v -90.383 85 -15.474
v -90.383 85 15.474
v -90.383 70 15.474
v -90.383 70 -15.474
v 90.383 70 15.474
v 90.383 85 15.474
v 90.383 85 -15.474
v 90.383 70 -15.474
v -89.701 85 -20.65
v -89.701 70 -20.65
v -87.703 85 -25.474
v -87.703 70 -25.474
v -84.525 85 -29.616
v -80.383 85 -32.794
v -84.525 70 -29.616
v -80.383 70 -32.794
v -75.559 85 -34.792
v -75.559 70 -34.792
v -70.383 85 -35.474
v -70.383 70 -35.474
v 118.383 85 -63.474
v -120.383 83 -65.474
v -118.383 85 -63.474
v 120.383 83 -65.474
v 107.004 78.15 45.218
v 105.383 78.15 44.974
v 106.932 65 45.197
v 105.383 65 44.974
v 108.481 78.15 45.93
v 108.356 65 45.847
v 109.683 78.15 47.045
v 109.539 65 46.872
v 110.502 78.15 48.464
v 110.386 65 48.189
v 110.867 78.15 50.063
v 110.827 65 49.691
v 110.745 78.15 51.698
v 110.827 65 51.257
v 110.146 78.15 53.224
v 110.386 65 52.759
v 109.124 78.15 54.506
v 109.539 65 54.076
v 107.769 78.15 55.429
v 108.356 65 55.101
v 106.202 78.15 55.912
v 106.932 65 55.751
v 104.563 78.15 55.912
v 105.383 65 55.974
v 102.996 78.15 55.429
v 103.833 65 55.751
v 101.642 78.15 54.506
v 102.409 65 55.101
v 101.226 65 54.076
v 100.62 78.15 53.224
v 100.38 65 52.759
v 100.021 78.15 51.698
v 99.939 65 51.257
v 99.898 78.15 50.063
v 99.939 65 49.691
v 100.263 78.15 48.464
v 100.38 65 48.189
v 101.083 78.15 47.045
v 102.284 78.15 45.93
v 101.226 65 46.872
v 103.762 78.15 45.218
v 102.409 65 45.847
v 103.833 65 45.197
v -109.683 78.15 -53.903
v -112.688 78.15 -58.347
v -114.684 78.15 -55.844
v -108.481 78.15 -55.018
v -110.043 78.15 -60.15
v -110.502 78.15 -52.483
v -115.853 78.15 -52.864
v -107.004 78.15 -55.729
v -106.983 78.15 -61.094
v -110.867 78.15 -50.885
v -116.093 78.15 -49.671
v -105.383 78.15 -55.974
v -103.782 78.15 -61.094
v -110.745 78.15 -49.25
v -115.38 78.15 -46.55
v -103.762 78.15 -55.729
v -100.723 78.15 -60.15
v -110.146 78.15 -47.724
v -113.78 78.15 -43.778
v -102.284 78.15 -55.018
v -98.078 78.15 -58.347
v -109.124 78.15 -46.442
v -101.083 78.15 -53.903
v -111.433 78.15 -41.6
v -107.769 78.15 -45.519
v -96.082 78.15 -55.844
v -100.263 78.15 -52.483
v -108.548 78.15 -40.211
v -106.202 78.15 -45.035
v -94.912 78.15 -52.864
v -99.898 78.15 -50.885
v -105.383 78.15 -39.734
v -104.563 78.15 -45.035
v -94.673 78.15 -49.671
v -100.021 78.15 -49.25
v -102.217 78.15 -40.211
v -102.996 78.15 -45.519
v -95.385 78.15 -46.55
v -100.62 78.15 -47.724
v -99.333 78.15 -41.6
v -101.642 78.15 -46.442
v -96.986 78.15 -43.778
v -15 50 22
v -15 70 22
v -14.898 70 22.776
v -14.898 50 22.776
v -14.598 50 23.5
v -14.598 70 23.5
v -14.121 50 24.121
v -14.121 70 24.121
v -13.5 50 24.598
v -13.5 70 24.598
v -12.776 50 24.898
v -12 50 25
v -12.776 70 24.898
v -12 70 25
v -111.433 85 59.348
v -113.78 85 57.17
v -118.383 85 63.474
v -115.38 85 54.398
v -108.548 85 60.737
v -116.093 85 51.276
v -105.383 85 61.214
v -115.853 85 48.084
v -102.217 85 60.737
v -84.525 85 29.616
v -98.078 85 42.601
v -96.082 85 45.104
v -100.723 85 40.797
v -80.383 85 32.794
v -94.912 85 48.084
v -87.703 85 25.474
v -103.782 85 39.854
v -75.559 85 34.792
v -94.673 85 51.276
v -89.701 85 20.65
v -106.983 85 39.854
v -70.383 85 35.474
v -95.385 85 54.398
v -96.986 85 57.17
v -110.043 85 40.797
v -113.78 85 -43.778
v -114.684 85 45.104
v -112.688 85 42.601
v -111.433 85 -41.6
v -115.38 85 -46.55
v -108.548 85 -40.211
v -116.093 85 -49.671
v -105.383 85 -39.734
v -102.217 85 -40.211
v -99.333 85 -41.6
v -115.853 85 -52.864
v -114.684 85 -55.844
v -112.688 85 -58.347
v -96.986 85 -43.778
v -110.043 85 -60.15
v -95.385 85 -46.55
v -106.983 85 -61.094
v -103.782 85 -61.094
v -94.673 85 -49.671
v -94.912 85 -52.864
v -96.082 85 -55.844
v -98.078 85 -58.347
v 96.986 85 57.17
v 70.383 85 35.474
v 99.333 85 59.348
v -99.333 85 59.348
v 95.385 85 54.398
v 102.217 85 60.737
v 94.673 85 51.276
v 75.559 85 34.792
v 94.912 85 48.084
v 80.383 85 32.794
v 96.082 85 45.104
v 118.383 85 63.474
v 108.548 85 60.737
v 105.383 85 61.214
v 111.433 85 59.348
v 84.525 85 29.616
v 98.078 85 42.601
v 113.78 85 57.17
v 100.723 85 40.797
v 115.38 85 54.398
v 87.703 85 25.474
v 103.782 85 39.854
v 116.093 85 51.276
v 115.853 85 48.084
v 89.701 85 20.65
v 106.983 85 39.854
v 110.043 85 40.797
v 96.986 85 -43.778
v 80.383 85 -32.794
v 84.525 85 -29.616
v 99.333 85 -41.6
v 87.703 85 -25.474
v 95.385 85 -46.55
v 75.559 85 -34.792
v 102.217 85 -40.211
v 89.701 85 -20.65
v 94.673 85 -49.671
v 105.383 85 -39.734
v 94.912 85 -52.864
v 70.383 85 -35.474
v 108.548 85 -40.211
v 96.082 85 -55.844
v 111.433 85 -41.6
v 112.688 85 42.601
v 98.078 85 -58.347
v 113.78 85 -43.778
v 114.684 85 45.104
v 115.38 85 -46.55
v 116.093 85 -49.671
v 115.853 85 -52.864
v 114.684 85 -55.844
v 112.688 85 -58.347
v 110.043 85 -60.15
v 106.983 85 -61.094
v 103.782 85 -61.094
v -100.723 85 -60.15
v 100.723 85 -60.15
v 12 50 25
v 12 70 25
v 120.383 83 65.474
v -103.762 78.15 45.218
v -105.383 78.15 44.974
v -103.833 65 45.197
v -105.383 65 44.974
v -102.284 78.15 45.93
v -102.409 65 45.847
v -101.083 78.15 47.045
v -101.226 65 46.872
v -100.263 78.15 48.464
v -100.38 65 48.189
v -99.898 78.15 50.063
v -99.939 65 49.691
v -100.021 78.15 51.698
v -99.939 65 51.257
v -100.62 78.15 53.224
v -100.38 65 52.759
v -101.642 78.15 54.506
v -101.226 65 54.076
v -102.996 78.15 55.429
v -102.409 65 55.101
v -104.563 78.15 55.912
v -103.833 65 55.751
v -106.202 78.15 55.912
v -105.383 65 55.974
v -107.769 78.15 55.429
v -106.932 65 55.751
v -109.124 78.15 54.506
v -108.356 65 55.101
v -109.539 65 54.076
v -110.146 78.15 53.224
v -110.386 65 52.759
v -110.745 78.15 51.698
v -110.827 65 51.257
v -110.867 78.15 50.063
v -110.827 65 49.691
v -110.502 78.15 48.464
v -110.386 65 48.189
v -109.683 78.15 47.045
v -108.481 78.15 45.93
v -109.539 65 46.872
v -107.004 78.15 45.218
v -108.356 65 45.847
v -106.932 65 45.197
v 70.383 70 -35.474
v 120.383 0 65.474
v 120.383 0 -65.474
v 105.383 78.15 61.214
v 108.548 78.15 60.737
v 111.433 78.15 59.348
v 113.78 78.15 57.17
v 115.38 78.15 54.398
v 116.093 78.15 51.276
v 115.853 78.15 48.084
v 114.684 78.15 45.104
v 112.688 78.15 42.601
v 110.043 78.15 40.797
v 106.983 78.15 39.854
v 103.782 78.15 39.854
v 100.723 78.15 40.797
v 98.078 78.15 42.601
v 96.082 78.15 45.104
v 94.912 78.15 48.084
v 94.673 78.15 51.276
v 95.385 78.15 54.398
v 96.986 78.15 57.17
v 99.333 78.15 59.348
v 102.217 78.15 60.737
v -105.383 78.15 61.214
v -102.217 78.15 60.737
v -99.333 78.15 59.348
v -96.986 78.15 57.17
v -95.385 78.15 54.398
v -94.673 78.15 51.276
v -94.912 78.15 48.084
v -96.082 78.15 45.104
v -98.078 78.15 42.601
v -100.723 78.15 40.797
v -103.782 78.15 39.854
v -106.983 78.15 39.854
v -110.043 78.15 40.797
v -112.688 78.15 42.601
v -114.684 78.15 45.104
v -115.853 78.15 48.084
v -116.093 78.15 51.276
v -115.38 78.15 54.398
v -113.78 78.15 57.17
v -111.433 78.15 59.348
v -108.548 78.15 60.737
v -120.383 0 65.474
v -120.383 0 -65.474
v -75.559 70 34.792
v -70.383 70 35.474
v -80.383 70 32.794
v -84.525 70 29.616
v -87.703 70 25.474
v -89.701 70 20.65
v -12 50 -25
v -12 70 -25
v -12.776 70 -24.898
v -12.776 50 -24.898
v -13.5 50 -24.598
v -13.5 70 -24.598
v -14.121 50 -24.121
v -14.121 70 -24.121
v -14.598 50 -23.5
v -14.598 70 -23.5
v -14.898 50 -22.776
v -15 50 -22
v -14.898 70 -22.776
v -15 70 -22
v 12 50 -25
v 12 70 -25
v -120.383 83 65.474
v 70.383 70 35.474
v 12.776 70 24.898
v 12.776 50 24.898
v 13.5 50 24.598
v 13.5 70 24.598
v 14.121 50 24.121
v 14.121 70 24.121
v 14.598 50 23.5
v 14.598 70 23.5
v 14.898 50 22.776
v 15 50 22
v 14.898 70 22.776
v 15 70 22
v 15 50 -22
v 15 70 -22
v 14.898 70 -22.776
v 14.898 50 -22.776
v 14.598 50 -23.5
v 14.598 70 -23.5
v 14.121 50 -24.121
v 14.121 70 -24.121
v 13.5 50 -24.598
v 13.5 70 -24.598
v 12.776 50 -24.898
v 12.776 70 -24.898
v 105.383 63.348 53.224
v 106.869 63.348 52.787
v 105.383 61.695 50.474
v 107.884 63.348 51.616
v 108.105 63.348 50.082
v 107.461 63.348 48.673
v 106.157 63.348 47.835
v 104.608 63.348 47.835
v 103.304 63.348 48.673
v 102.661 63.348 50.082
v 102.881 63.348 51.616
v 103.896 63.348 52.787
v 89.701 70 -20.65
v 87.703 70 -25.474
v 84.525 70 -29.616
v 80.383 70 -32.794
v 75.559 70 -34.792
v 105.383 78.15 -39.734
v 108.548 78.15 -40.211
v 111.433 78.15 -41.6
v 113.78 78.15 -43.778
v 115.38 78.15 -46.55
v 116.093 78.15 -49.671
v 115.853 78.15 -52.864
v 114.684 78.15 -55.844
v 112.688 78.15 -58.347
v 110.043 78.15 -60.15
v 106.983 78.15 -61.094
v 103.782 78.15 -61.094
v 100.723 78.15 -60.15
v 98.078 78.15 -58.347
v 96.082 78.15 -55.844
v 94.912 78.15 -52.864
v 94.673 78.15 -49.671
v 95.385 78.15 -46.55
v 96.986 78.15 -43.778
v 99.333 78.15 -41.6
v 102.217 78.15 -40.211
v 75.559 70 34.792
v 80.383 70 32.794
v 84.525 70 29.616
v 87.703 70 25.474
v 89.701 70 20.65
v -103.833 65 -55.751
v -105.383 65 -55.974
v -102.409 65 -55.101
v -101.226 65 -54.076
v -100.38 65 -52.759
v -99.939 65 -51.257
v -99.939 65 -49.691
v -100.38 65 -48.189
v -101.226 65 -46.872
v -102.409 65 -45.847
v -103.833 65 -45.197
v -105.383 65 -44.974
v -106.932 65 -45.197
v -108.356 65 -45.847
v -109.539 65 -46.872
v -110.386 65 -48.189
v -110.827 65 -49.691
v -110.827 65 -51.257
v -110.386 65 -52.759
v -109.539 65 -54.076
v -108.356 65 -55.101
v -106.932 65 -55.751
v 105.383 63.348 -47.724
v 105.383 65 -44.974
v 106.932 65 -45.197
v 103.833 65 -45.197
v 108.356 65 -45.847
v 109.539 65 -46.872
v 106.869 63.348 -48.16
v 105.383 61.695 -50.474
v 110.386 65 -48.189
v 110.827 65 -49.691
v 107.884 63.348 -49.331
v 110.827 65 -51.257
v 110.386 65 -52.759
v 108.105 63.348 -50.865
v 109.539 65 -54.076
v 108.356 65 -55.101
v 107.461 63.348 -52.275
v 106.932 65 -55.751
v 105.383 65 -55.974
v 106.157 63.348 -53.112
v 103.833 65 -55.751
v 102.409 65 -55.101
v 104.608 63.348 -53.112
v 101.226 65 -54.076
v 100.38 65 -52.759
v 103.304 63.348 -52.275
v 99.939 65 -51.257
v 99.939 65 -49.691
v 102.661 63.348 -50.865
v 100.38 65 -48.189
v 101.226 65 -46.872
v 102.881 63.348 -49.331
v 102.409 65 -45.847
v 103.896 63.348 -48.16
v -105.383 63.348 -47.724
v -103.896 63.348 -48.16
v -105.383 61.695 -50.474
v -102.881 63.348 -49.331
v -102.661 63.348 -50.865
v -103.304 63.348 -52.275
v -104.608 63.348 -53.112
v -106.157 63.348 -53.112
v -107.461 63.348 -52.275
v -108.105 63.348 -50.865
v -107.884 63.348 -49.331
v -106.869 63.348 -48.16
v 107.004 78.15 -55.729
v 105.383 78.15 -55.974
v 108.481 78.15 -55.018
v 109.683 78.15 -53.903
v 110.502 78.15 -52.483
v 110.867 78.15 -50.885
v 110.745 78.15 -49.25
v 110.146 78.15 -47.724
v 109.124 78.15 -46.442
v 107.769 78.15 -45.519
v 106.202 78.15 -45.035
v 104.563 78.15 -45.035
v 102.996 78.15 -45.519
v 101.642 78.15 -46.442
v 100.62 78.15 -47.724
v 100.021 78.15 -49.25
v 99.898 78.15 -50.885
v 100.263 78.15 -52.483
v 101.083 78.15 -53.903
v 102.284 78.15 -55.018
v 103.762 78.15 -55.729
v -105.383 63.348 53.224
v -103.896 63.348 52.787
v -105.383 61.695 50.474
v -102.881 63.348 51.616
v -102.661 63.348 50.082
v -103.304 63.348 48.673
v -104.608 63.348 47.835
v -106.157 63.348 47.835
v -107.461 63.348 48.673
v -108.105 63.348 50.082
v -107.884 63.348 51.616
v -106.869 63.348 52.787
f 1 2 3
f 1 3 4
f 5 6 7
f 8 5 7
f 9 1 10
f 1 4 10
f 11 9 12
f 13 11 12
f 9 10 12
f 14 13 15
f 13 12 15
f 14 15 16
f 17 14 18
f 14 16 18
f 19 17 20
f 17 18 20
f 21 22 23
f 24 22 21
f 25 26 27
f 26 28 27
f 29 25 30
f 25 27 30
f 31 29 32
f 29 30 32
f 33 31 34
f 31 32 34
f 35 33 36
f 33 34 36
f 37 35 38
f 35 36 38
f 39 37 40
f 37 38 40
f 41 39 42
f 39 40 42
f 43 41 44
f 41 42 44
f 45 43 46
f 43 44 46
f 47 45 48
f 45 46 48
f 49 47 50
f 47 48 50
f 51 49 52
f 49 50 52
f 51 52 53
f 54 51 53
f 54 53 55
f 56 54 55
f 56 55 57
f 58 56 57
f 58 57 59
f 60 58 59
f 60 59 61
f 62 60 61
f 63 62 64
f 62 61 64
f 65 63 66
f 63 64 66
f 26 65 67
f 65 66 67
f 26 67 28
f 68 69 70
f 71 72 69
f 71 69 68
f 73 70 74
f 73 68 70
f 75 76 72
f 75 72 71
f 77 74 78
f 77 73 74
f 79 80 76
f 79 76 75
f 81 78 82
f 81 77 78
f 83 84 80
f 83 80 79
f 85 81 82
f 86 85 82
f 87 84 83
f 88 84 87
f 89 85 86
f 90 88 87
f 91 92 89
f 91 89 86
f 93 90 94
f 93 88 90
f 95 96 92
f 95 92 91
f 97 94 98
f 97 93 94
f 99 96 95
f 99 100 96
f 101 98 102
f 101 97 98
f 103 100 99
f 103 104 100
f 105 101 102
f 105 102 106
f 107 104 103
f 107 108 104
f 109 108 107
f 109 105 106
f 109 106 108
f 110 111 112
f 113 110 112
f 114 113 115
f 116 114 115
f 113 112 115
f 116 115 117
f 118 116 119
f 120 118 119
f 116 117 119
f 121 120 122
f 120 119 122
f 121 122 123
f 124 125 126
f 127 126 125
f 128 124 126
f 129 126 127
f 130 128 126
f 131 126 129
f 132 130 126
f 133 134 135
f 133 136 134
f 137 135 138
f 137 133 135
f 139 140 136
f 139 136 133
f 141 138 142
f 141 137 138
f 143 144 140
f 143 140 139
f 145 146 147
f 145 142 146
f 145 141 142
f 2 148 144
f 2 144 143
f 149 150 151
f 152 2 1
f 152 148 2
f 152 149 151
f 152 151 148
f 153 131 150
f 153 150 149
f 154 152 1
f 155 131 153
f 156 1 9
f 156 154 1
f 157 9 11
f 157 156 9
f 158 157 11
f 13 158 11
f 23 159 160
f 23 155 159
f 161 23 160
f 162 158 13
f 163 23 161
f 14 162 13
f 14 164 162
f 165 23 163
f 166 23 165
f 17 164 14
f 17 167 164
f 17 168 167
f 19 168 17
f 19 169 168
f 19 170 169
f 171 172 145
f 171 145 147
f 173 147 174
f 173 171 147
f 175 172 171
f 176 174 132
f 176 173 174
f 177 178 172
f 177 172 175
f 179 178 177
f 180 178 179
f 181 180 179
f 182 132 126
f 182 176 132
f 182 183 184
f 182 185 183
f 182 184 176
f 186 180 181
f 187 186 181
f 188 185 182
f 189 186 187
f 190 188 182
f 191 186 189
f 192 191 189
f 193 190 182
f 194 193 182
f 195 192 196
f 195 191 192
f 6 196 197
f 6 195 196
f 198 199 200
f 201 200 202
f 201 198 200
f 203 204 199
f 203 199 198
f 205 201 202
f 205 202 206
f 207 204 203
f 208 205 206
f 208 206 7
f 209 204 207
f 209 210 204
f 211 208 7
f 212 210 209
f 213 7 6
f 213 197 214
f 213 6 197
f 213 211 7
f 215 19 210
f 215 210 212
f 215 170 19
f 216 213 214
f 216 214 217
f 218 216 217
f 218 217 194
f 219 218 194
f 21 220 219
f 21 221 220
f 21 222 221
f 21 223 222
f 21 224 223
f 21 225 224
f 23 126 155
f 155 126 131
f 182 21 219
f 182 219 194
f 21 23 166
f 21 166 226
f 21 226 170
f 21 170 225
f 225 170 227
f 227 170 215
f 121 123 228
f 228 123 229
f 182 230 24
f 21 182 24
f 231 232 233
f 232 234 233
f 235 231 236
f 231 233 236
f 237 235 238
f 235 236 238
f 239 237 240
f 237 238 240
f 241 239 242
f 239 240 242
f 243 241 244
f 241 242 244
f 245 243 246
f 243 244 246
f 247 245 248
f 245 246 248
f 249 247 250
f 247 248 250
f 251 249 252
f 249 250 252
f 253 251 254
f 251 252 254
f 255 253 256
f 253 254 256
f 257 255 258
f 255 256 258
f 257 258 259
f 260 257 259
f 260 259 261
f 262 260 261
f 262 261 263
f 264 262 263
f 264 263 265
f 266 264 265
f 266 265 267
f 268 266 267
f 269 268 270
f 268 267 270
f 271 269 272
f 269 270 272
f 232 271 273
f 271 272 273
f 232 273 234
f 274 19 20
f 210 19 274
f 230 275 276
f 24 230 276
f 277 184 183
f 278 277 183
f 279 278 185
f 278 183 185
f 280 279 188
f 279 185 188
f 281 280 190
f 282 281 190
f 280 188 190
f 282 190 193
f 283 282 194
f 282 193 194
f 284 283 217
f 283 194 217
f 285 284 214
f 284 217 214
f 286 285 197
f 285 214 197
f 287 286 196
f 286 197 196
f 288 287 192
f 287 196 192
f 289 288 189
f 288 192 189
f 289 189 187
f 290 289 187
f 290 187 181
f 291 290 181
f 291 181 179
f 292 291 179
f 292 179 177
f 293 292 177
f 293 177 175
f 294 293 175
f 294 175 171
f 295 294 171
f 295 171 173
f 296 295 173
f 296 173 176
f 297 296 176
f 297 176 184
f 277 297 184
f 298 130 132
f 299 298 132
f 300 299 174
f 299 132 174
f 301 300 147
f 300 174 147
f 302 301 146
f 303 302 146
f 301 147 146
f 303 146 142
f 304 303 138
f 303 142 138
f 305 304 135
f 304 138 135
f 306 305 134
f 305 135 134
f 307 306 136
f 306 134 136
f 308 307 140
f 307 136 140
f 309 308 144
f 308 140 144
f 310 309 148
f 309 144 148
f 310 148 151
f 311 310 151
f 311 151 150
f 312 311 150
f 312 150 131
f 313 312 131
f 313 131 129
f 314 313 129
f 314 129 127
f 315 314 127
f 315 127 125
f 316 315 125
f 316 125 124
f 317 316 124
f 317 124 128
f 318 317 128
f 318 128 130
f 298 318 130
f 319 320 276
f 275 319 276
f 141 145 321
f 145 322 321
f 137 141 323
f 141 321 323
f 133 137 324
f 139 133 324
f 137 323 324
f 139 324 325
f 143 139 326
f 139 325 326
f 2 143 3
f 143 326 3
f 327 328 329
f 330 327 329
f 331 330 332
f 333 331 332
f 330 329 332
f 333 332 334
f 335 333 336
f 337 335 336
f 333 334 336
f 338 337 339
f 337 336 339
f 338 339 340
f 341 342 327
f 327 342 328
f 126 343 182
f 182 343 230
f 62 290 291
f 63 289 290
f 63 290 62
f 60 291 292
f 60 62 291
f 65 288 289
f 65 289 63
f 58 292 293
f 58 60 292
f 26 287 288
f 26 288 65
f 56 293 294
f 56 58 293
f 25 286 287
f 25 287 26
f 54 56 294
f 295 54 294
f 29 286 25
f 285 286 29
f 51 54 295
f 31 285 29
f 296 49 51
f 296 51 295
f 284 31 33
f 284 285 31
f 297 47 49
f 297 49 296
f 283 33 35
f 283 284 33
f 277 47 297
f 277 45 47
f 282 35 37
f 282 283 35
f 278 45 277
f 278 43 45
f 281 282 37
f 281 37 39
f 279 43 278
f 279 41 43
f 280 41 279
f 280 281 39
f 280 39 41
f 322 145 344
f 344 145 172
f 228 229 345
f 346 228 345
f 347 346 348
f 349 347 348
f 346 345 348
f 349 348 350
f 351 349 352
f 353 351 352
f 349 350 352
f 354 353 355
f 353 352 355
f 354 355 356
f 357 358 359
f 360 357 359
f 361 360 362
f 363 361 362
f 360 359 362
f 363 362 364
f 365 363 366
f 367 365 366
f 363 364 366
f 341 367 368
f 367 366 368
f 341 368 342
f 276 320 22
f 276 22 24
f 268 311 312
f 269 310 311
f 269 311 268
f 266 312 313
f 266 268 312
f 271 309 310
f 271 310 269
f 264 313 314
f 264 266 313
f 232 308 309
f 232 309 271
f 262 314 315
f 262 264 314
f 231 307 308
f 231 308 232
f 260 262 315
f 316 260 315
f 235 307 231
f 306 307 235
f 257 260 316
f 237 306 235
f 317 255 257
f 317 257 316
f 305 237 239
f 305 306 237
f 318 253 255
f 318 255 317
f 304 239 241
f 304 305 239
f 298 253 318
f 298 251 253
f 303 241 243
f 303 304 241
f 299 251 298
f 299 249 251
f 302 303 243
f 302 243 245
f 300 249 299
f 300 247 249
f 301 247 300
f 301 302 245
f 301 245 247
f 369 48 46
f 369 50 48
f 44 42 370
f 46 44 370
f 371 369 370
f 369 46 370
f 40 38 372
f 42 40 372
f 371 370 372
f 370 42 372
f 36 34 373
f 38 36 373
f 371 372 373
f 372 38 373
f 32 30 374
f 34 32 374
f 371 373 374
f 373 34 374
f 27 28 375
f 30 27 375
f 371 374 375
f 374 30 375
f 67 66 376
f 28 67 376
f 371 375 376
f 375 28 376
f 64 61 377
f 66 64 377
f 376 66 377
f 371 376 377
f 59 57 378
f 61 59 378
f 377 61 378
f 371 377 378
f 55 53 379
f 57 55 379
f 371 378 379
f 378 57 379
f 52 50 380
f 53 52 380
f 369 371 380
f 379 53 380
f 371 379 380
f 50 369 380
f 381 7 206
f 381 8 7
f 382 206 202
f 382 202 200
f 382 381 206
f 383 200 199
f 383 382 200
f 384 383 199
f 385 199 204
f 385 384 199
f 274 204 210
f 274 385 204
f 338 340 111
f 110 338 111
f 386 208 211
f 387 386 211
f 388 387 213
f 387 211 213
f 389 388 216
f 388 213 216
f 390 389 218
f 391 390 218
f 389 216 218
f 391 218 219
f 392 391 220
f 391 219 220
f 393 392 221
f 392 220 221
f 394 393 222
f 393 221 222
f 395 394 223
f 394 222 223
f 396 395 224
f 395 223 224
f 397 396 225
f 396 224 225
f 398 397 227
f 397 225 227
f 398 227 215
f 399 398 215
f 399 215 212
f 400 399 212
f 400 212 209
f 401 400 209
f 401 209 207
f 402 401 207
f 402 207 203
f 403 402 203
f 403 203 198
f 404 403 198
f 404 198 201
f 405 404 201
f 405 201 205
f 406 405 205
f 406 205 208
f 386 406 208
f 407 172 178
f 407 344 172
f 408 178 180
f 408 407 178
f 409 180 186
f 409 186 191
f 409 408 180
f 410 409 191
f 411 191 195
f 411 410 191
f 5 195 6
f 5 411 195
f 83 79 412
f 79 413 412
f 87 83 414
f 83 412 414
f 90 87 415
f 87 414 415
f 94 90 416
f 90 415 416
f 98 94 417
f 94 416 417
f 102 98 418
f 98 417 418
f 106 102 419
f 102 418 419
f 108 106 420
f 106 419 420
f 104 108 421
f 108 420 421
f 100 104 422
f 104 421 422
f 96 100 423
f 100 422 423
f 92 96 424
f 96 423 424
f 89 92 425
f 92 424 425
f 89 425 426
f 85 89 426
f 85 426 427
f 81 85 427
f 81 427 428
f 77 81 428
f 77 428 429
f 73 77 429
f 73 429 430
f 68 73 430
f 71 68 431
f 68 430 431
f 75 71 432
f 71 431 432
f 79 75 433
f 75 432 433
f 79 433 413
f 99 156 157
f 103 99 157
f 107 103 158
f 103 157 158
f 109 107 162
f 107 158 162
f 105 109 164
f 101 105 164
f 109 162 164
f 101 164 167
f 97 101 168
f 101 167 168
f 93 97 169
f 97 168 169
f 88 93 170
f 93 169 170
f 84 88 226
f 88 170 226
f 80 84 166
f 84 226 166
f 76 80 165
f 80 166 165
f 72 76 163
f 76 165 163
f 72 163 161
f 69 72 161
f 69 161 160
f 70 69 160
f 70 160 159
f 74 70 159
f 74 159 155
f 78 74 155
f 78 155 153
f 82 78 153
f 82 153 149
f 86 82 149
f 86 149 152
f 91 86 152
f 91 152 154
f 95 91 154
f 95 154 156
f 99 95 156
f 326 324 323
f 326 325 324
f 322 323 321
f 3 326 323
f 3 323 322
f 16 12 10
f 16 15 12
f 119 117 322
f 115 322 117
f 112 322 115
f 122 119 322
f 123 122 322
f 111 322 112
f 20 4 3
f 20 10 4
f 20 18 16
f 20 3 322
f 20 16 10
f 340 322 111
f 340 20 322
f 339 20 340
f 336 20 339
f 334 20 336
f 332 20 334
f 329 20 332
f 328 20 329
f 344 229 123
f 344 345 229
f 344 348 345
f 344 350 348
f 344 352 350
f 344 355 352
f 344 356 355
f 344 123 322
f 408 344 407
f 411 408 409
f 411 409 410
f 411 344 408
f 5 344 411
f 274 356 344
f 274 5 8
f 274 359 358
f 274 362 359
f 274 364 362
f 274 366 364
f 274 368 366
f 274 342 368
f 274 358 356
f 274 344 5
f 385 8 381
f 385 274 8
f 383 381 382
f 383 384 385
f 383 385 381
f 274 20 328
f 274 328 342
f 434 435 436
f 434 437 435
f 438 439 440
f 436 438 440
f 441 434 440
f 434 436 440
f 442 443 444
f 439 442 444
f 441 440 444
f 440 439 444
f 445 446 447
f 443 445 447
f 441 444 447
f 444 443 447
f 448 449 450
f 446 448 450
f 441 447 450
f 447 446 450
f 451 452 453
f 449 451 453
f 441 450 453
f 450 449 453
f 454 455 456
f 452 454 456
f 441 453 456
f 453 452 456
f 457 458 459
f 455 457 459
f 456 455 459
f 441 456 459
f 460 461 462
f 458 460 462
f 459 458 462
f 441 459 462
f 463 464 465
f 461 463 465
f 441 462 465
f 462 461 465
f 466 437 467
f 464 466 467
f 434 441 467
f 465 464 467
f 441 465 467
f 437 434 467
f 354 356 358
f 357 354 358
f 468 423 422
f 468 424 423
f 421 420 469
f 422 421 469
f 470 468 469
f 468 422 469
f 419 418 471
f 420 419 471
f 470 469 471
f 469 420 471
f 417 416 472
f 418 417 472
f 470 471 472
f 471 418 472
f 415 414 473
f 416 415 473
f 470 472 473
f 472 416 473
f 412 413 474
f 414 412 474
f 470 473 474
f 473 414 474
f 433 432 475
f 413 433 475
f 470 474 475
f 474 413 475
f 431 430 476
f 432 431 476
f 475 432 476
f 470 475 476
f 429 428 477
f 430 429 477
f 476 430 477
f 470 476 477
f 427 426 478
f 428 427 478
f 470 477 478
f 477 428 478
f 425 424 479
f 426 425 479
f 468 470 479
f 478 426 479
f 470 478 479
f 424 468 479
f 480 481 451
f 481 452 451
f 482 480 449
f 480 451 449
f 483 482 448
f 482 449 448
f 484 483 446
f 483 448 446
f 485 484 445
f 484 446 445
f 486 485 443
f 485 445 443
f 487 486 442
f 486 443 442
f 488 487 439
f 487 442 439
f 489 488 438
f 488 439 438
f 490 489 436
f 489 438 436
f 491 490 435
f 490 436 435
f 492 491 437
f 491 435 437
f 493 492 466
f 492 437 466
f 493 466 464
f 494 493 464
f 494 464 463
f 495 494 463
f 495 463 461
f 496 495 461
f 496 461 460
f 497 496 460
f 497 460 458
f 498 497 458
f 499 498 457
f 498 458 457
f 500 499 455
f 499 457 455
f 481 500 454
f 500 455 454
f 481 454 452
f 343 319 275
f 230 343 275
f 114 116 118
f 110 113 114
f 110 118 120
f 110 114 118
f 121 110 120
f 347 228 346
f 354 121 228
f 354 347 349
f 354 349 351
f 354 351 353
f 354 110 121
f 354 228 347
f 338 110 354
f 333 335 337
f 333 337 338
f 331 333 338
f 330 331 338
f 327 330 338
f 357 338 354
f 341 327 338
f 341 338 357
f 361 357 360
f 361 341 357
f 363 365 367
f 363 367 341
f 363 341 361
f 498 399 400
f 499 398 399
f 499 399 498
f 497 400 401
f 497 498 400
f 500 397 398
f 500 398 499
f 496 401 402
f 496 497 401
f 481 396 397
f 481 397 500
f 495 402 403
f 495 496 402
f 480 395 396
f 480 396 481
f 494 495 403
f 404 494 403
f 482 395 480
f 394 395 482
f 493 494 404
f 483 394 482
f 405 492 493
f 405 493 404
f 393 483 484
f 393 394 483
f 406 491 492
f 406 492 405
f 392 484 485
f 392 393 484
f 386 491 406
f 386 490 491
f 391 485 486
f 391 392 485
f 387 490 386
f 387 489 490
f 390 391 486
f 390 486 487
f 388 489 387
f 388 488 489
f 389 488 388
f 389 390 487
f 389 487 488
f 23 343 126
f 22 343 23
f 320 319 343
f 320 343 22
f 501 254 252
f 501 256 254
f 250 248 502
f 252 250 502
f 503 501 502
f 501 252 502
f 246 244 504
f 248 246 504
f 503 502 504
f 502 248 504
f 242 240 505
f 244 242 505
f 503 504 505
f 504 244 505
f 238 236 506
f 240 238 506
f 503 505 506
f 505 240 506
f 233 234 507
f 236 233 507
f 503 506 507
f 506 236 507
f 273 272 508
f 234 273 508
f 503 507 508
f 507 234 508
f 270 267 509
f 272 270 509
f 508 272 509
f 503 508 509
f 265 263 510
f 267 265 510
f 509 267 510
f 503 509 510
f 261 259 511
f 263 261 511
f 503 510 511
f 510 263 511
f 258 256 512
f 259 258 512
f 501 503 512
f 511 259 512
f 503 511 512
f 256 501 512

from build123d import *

# Parameters (mm, degrees)
SKETCH3_W                                = 240.765342714
SKETCH3_H                                = 130.947670476
BOSS_EXTRUDE2_DEPTH                      = 85
SKETCH4_W                                = 180.765342714
SKETCH4_H                                = 70.947670476
CUT_EXTRUDE1_DEPTH                       = 15
CBORE_FOR_M10_HEX_HEAD_BOLT1_D           = 11
CBORE_FOR_M10_HEX_HEAD_BOLT1_DEPTH       = 20
CBORE_FOR_M10_HEX_HEAD_BOLT1_CBORE_D     = 21.48
CBORE_FOR_M10_HEX_HEAD_BOLT1_CBORE_DEPTH = 6.85
CBORE_FOR_M10_HEX_HEAD_BOLT1_TIP         = 3.304733405
FILLET1_R                                = 20
CHAMFER1_SIZE                            = 2
CUT_EXTRUDE2_DEPTH                       = 20


with BuildPart() as part:
    # Sketch3 → Boss-Extrude2 (new body)
    with BuildSketch(Plane(origin=(0, 0, 0), x_dir=(1, 0, 0), z_dir=(0, 1, 0))):
        Rectangle(SKETCH3_W, SKETCH3_H)
    extrude(amount=BOSS_EXTRUDE2_DEPTH)

    # Sketch4 → Cut-Extrude1 (cut)
    with BuildSketch(Plane(origin=(0, 85, 0), x_dir=(1, 0, 0), z_dir=(0, 1, 0))):
        Rectangle(SKETCH4_W, SKETCH4_H)
    extrude(amount=-CUT_EXTRUDE1_DEPTH, mode=Mode.SUBTRACT)

    # CBORE for M10 Hex Head Bolt1
    with Locations(Plane(origin=(-105.382671357, 85, -50.473835238), x_dir=(0, 0, 1), z_dir=(0, 1, 0))):
        with Locations((0, 0), (100.947670476, 0), (0, 210.765342714), (100.947670476, 210.765342714)):
            CounterBoreHole(CBORE_FOR_M10_HEX_HEAD_BOLT1_D / 2, CBORE_FOR_M10_HEX_HEAD_BOLT1_CBORE_D / 2, CBORE_FOR_M10_HEX_HEAD_BOLT1_CBORE_DEPTH, depth=CBORE_FOR_M10_HEX_HEAD_BOLT1_DEPTH)
            with Locations((0, 0, -(CBORE_FOR_M10_HEX_HEAD_BOLT1_DEPTH + CBORE_FOR_M10_HEX_HEAD_BOLT1_TIP / 2))):  # 118° drill point
                Cone(0, CBORE_FOR_M10_HEX_HEAD_BOLT1_D / 2, CBORE_FOR_M10_HEX_HEAD_BOLT1_TIP, mode=Mode.SUBTRACT)

    # Fillet1
    fillet1_edges = [part.edges().sort_by_distance(p)[0] for p in [
        (90.382671357, 77.5, 35.473835238),
        (-90.382671357, 77.5, 35.473835238),
        (-90.382671357, 77.5, -35.473835238),
        (90.382671357, 77.5, -35.473835238),
    ]]
    fillet(fillet1_edges, radius=FILLET1_R)

    # Chamfer1
    chamfer1_edges = [part.edges().sort_by_distance(p)[0] for p in [
        (-120.382671357, 85, 0),
        (0, 85, 65.473835238),
        (120.382671357, 85, 0),
        (0, 85, -65.473835238),
    ]]
    chamfer(chamfer1_edges, length=CHAMFER1_SIZE)

    # Sketch7 → Cut-Extrude2 (cut)
    with BuildSketch(Plane(origin=(0, 70, 0), x_dir=(1, 0, 0), z_dir=(0, 1, 0))):
        with BuildLine():
            Line((-12, -25), (12, -25))
            ThreePointArc((12, -25), (14.121320344, -24.121320344), (15, -22))
            Line((15, -22), (15, 22))
            ThreePointArc((15, 22), (14.121320344, 24.121320344), (12, 25))
            Line((12, 25), (-12, 25))
            ThreePointArc((-12, 25), (-14.121320344, 24.121320344), (-15, 22))
            Line((-15, 22), (-15, -22))
            ThreePointArc((-15, -22), (-14.121320344, -24.121320344), (-12, -25))
        make_face()
    extrude(amount=-CUT_EXTRUDE2_DEPTH, mode=Mode.SUBTRACT)


solid = part.part
